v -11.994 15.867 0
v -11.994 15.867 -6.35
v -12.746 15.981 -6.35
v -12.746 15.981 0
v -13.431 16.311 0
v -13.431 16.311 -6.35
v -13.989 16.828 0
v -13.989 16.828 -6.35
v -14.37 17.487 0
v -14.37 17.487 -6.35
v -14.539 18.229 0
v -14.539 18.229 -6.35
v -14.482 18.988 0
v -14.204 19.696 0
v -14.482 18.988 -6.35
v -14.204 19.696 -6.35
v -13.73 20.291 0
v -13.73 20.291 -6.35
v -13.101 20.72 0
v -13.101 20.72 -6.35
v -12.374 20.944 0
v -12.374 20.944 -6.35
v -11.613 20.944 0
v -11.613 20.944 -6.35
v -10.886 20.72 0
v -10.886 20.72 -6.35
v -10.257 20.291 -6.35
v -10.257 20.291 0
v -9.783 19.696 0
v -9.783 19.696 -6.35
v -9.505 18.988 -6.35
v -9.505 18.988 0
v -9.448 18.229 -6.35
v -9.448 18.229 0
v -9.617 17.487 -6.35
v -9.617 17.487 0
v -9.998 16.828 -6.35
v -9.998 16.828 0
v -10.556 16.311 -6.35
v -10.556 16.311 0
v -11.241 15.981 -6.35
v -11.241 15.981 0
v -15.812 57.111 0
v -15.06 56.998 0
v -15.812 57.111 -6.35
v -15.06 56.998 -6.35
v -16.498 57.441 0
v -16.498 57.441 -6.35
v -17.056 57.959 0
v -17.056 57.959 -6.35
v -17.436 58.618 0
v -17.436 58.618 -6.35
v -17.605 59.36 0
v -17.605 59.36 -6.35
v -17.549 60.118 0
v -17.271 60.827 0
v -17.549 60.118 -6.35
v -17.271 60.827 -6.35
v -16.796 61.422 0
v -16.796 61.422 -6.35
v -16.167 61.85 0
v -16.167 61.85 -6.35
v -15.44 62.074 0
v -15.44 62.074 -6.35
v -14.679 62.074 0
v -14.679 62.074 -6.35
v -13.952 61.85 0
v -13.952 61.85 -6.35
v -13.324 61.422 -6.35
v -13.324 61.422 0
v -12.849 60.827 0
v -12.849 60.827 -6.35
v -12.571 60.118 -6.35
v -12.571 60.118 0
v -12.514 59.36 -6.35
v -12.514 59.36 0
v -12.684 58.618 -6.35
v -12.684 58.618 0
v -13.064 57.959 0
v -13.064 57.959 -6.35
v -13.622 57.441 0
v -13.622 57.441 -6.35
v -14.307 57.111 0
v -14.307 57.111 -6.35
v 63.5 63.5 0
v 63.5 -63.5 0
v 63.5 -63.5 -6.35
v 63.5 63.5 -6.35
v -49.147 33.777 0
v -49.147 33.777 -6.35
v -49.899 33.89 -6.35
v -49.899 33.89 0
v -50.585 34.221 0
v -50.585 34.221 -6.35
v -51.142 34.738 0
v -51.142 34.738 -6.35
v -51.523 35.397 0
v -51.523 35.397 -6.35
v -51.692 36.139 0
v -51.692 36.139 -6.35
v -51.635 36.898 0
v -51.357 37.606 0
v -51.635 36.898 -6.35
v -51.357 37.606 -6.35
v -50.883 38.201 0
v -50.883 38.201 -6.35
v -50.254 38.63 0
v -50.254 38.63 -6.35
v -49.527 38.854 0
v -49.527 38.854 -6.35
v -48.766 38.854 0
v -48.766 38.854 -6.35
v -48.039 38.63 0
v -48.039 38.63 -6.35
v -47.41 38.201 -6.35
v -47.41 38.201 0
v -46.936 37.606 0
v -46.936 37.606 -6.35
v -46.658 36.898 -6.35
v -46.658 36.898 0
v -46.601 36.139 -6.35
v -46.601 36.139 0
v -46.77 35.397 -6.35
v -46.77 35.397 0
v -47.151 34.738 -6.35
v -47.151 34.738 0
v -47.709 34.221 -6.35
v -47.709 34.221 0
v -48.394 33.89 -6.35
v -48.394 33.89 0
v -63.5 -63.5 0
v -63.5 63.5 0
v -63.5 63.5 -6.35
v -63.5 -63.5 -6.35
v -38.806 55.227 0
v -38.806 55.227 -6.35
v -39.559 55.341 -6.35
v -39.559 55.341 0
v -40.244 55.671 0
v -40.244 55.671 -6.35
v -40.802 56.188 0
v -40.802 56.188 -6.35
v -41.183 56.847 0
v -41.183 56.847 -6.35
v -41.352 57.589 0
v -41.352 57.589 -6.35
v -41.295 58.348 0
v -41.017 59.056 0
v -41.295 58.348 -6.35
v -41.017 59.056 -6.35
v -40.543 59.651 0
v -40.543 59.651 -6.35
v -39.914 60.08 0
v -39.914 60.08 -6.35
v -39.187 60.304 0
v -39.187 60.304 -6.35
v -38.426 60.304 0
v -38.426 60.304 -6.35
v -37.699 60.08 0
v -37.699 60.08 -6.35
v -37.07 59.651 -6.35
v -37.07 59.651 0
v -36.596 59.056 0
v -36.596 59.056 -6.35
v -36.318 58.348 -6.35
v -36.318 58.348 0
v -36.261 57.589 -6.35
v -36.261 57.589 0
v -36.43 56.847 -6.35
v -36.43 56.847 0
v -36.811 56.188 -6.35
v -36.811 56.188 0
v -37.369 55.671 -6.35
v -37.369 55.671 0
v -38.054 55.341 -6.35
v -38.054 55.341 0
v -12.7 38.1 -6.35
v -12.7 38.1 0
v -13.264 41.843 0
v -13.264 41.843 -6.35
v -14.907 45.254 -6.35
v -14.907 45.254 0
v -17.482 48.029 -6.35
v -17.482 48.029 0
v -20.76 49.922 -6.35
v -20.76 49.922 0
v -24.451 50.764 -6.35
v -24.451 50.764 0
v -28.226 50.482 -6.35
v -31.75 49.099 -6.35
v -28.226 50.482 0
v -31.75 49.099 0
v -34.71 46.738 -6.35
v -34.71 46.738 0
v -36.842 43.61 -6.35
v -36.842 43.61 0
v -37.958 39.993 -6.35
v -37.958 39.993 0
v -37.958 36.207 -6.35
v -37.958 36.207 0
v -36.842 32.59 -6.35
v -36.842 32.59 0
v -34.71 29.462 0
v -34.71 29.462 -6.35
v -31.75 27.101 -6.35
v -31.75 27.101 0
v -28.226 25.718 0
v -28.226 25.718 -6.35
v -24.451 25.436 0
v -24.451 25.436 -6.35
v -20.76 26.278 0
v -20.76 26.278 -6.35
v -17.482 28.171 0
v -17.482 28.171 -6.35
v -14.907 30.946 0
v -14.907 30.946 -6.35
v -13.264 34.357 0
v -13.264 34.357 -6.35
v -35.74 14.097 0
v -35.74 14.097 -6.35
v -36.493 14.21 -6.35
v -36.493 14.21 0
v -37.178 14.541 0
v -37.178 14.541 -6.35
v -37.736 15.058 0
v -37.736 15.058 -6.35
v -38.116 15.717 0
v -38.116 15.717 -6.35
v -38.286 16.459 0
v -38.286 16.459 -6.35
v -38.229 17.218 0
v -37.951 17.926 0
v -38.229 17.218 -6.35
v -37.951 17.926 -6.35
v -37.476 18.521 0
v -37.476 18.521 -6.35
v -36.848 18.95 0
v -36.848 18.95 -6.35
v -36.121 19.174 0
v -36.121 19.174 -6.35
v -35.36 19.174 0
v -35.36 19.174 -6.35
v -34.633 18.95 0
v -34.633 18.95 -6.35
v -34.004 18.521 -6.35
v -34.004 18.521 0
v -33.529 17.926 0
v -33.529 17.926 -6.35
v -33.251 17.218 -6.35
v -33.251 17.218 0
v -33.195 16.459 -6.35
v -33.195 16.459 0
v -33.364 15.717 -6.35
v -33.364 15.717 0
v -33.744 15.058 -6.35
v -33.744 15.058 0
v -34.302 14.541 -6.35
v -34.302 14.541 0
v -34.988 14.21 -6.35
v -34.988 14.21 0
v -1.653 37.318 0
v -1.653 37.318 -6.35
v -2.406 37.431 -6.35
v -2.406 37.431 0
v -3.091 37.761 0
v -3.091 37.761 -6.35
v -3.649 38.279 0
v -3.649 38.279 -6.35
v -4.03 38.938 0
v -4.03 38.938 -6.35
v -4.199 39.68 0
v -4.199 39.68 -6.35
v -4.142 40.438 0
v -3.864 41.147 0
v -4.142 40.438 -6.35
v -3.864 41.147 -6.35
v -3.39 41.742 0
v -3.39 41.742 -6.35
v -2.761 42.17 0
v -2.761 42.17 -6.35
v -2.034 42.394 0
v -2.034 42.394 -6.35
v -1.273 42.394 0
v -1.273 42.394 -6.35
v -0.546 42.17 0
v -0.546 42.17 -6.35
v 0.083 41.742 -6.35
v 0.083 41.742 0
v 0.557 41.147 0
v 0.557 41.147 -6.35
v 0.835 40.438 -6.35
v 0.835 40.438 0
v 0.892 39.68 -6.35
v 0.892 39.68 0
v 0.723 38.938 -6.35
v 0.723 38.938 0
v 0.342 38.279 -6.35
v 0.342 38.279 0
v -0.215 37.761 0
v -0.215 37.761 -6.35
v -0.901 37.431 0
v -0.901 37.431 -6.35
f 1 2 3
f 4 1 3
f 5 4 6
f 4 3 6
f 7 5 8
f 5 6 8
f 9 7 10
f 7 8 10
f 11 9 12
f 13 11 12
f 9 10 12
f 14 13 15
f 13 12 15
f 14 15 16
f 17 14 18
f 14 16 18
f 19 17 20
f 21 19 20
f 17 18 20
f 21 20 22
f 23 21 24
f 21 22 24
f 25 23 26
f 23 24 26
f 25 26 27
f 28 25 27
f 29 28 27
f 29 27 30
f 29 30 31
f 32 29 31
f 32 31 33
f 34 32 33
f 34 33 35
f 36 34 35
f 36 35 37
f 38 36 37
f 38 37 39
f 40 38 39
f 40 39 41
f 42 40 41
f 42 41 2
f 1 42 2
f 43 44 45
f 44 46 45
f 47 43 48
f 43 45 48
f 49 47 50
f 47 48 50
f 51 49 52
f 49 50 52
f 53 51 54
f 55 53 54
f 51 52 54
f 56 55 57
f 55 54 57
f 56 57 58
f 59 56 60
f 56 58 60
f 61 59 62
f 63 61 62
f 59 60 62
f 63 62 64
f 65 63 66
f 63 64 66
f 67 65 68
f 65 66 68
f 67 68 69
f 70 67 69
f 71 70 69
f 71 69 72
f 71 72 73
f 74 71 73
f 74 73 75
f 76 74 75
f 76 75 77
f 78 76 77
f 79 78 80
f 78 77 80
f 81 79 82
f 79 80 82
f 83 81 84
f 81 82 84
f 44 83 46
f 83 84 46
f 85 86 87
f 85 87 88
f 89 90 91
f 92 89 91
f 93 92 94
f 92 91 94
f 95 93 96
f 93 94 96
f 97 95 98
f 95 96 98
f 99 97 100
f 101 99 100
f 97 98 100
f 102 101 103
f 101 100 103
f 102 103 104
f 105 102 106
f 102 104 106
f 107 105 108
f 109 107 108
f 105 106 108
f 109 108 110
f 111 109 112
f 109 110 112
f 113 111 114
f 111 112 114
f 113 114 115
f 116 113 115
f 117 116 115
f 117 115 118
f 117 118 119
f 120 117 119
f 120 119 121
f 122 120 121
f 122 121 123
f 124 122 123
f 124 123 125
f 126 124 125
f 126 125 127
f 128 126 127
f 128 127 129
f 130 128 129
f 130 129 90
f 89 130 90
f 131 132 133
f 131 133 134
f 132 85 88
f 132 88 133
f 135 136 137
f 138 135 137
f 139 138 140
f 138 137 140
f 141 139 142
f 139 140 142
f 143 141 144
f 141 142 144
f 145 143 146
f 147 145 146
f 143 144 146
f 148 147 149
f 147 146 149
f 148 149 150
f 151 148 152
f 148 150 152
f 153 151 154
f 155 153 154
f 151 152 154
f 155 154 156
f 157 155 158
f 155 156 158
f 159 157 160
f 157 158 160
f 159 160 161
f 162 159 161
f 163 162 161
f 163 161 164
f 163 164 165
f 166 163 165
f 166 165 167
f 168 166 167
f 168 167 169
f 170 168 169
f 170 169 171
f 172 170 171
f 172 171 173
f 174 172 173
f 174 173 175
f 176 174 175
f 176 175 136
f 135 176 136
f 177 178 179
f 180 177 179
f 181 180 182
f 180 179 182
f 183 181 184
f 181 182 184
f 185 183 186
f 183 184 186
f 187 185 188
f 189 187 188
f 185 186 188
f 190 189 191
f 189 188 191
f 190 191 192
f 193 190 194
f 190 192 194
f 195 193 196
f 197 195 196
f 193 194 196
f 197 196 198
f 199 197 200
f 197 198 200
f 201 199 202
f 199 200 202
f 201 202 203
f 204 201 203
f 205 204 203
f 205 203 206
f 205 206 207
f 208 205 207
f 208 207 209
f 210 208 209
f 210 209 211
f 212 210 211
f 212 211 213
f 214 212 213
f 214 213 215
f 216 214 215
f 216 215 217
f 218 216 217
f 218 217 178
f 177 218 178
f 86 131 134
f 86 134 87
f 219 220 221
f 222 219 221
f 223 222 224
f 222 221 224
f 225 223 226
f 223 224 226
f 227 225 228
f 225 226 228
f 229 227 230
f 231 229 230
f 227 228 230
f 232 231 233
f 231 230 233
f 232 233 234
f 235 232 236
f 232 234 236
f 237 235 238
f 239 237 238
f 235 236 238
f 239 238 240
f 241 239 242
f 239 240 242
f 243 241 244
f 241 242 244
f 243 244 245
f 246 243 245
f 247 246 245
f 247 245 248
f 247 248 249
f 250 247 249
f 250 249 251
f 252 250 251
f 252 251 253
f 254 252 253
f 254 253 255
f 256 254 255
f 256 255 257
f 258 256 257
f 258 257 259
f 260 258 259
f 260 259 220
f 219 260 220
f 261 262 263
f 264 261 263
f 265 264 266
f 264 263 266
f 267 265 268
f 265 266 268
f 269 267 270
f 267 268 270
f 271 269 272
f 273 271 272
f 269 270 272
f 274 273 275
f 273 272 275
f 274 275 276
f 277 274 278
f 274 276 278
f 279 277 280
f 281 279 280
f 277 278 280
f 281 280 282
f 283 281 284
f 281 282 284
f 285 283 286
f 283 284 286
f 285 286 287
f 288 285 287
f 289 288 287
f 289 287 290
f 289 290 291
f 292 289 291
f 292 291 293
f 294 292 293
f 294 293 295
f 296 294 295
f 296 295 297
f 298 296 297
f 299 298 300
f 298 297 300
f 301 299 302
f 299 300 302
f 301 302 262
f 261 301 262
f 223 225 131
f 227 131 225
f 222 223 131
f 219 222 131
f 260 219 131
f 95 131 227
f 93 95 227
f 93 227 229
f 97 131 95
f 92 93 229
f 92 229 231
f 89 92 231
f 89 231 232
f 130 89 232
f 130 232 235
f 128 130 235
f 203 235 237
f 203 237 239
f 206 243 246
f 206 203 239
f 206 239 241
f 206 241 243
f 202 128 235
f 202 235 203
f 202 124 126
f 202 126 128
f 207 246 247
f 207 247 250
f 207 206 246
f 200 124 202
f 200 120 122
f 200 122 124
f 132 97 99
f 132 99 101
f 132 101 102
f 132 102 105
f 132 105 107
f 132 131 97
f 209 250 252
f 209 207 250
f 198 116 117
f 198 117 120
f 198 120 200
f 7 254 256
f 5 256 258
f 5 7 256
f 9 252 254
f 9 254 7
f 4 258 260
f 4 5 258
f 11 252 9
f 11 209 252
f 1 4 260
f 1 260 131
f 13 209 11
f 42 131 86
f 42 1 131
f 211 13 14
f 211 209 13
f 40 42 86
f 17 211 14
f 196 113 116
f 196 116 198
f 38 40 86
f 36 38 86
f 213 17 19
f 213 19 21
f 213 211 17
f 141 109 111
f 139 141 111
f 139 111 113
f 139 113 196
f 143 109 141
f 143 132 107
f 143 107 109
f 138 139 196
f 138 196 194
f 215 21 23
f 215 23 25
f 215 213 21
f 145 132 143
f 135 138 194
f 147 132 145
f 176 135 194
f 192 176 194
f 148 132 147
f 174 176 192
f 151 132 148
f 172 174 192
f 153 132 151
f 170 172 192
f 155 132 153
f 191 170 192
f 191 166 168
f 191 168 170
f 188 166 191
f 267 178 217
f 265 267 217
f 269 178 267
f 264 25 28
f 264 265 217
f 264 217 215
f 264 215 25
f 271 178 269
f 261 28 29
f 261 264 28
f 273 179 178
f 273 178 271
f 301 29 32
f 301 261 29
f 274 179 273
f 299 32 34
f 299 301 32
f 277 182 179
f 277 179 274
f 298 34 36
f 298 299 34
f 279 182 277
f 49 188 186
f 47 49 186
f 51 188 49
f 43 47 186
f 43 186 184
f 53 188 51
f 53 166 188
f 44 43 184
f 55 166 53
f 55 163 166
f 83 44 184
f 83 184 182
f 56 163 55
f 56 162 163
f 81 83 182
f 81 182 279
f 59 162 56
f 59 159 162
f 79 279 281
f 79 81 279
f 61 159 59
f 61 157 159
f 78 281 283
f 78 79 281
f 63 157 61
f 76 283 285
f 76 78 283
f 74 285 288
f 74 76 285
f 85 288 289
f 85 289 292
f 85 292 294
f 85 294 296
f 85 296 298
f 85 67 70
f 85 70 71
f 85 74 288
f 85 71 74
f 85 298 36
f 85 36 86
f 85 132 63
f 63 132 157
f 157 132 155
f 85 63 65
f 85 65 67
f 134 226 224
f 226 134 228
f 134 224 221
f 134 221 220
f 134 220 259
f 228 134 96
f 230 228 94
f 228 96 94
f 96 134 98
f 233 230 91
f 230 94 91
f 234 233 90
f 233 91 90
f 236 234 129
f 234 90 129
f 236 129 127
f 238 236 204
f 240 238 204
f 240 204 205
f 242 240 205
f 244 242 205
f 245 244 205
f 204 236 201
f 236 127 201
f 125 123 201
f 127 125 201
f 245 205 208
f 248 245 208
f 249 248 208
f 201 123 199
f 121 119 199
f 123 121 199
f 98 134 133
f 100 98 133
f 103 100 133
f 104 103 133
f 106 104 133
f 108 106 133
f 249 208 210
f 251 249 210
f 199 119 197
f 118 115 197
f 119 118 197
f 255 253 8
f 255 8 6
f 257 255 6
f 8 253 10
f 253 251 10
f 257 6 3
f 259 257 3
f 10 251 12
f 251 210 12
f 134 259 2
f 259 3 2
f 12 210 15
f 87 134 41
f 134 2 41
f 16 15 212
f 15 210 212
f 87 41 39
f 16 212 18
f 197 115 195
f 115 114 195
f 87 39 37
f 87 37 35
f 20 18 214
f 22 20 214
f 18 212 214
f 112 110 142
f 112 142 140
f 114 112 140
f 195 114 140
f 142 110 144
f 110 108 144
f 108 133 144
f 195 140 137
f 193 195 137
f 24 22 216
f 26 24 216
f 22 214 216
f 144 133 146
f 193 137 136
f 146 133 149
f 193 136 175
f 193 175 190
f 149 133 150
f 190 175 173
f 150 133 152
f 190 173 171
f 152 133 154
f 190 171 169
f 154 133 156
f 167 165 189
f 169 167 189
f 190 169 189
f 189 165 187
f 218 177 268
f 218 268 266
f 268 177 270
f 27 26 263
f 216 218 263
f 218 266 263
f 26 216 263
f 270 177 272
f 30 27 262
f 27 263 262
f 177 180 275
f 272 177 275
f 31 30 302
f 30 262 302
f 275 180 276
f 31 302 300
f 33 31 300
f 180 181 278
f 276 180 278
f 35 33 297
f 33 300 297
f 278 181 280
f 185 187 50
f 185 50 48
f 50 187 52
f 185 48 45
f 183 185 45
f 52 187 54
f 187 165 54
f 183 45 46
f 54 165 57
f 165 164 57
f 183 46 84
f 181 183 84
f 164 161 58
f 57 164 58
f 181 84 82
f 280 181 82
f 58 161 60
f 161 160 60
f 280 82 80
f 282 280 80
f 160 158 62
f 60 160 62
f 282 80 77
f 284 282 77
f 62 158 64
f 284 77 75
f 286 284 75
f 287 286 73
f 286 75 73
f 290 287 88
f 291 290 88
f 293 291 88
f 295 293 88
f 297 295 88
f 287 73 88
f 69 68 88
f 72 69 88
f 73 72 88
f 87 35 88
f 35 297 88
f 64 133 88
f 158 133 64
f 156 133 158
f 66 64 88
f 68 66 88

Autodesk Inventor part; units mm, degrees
ref_plane "YZ Plane" through (0, 0, 0) normal (1, 0, 0) x (0, 1, 0)
ref_plane "XZ Plane" through (0, 0, 0) normal (0, 1, 0) x (-1, 0, 0)
ref_plane "XY Plane" through (0, 0, 0) normal (0, 0, 1) x (1, 0, 0)
sketch "Sketch1" plane through (0, 0, 0) normal (0, 0, 1) x (1, 0, 0)
  line L0 (-63.5, -63.5) -> (63.5, -63.5)
  line L1 (63.5, -63.5) -> (63.5, 63.5)
  line L2 (63.5, 63.5) -> (-63.5, 63.5)
  line L3 (-63.5, 63.5) -> (-63.5, -63.5)
  point P0 (0, 0)
  dimension "d19" = 63.5
extrude "Extrusion1" add sketch "Sketch1" against normal blind 6.35
sketch "Sketch2" plane through (0, 0, 0) normal (0, 0, 1) x (1, 0, 0)
  circle A0 centre (-25.4, 38.1) radius 12.7
  line L0 (63.5, 63.5) -> (-63.5, 63.5) projected
  line L1 (-63.5, -63.5) -> (-63.5, 63.5) projected
  dimension "d4" = 25.4
  dimension "d20" = 25.4
  dimension "d23" = 38.1
extrude "Extrusion2" cut sketch "Sketch2" against normal through all
sketch "Sketch3" plane through (0, 0, 0) normal (0, 0, 1) x (1, 0, 0)
  circle A0 centre (-25.4, 38.1) radius 23.8125 construction
  line L0 (63.5, 63.5) -> (-63.5, 63.5) projected
  line L1 (-63.5, 63.5) -> (-63.5, -63.5) projected
  point P0 (-15.0599, 59.5503)
  point P1 (-1.6534, 39.8703)
  point P2 (-11.9935, 18.42)
  point P3 (-35.7401, 16.6497)
  point P4 (-49.1466, 36.3297)
  point P5 (-38.8065, 57.78)
  dimension "d7" = 47.625
  dimension "d10" = 360
  dimension "d21" = 25.4
  dimension "d22" = 38.1
hole "Hole1" at (-15.0599, 59.5503, 0) at (-1.6534, 39.8703, 0) at (-11.9935, 18.42, 0) at (-35.7401, 16.6497, 0) at (-49.1466, 36.3297, 0) at (-38.8065, 57.78, 0) direction (0, 0, -1) diameter 5.1054 end through all clearance for "Flat Head Machine Screw (82)" size "#10" standard "Ansi Unified Screw Threads"
properties part number "supportPlateForLinearActuator"
